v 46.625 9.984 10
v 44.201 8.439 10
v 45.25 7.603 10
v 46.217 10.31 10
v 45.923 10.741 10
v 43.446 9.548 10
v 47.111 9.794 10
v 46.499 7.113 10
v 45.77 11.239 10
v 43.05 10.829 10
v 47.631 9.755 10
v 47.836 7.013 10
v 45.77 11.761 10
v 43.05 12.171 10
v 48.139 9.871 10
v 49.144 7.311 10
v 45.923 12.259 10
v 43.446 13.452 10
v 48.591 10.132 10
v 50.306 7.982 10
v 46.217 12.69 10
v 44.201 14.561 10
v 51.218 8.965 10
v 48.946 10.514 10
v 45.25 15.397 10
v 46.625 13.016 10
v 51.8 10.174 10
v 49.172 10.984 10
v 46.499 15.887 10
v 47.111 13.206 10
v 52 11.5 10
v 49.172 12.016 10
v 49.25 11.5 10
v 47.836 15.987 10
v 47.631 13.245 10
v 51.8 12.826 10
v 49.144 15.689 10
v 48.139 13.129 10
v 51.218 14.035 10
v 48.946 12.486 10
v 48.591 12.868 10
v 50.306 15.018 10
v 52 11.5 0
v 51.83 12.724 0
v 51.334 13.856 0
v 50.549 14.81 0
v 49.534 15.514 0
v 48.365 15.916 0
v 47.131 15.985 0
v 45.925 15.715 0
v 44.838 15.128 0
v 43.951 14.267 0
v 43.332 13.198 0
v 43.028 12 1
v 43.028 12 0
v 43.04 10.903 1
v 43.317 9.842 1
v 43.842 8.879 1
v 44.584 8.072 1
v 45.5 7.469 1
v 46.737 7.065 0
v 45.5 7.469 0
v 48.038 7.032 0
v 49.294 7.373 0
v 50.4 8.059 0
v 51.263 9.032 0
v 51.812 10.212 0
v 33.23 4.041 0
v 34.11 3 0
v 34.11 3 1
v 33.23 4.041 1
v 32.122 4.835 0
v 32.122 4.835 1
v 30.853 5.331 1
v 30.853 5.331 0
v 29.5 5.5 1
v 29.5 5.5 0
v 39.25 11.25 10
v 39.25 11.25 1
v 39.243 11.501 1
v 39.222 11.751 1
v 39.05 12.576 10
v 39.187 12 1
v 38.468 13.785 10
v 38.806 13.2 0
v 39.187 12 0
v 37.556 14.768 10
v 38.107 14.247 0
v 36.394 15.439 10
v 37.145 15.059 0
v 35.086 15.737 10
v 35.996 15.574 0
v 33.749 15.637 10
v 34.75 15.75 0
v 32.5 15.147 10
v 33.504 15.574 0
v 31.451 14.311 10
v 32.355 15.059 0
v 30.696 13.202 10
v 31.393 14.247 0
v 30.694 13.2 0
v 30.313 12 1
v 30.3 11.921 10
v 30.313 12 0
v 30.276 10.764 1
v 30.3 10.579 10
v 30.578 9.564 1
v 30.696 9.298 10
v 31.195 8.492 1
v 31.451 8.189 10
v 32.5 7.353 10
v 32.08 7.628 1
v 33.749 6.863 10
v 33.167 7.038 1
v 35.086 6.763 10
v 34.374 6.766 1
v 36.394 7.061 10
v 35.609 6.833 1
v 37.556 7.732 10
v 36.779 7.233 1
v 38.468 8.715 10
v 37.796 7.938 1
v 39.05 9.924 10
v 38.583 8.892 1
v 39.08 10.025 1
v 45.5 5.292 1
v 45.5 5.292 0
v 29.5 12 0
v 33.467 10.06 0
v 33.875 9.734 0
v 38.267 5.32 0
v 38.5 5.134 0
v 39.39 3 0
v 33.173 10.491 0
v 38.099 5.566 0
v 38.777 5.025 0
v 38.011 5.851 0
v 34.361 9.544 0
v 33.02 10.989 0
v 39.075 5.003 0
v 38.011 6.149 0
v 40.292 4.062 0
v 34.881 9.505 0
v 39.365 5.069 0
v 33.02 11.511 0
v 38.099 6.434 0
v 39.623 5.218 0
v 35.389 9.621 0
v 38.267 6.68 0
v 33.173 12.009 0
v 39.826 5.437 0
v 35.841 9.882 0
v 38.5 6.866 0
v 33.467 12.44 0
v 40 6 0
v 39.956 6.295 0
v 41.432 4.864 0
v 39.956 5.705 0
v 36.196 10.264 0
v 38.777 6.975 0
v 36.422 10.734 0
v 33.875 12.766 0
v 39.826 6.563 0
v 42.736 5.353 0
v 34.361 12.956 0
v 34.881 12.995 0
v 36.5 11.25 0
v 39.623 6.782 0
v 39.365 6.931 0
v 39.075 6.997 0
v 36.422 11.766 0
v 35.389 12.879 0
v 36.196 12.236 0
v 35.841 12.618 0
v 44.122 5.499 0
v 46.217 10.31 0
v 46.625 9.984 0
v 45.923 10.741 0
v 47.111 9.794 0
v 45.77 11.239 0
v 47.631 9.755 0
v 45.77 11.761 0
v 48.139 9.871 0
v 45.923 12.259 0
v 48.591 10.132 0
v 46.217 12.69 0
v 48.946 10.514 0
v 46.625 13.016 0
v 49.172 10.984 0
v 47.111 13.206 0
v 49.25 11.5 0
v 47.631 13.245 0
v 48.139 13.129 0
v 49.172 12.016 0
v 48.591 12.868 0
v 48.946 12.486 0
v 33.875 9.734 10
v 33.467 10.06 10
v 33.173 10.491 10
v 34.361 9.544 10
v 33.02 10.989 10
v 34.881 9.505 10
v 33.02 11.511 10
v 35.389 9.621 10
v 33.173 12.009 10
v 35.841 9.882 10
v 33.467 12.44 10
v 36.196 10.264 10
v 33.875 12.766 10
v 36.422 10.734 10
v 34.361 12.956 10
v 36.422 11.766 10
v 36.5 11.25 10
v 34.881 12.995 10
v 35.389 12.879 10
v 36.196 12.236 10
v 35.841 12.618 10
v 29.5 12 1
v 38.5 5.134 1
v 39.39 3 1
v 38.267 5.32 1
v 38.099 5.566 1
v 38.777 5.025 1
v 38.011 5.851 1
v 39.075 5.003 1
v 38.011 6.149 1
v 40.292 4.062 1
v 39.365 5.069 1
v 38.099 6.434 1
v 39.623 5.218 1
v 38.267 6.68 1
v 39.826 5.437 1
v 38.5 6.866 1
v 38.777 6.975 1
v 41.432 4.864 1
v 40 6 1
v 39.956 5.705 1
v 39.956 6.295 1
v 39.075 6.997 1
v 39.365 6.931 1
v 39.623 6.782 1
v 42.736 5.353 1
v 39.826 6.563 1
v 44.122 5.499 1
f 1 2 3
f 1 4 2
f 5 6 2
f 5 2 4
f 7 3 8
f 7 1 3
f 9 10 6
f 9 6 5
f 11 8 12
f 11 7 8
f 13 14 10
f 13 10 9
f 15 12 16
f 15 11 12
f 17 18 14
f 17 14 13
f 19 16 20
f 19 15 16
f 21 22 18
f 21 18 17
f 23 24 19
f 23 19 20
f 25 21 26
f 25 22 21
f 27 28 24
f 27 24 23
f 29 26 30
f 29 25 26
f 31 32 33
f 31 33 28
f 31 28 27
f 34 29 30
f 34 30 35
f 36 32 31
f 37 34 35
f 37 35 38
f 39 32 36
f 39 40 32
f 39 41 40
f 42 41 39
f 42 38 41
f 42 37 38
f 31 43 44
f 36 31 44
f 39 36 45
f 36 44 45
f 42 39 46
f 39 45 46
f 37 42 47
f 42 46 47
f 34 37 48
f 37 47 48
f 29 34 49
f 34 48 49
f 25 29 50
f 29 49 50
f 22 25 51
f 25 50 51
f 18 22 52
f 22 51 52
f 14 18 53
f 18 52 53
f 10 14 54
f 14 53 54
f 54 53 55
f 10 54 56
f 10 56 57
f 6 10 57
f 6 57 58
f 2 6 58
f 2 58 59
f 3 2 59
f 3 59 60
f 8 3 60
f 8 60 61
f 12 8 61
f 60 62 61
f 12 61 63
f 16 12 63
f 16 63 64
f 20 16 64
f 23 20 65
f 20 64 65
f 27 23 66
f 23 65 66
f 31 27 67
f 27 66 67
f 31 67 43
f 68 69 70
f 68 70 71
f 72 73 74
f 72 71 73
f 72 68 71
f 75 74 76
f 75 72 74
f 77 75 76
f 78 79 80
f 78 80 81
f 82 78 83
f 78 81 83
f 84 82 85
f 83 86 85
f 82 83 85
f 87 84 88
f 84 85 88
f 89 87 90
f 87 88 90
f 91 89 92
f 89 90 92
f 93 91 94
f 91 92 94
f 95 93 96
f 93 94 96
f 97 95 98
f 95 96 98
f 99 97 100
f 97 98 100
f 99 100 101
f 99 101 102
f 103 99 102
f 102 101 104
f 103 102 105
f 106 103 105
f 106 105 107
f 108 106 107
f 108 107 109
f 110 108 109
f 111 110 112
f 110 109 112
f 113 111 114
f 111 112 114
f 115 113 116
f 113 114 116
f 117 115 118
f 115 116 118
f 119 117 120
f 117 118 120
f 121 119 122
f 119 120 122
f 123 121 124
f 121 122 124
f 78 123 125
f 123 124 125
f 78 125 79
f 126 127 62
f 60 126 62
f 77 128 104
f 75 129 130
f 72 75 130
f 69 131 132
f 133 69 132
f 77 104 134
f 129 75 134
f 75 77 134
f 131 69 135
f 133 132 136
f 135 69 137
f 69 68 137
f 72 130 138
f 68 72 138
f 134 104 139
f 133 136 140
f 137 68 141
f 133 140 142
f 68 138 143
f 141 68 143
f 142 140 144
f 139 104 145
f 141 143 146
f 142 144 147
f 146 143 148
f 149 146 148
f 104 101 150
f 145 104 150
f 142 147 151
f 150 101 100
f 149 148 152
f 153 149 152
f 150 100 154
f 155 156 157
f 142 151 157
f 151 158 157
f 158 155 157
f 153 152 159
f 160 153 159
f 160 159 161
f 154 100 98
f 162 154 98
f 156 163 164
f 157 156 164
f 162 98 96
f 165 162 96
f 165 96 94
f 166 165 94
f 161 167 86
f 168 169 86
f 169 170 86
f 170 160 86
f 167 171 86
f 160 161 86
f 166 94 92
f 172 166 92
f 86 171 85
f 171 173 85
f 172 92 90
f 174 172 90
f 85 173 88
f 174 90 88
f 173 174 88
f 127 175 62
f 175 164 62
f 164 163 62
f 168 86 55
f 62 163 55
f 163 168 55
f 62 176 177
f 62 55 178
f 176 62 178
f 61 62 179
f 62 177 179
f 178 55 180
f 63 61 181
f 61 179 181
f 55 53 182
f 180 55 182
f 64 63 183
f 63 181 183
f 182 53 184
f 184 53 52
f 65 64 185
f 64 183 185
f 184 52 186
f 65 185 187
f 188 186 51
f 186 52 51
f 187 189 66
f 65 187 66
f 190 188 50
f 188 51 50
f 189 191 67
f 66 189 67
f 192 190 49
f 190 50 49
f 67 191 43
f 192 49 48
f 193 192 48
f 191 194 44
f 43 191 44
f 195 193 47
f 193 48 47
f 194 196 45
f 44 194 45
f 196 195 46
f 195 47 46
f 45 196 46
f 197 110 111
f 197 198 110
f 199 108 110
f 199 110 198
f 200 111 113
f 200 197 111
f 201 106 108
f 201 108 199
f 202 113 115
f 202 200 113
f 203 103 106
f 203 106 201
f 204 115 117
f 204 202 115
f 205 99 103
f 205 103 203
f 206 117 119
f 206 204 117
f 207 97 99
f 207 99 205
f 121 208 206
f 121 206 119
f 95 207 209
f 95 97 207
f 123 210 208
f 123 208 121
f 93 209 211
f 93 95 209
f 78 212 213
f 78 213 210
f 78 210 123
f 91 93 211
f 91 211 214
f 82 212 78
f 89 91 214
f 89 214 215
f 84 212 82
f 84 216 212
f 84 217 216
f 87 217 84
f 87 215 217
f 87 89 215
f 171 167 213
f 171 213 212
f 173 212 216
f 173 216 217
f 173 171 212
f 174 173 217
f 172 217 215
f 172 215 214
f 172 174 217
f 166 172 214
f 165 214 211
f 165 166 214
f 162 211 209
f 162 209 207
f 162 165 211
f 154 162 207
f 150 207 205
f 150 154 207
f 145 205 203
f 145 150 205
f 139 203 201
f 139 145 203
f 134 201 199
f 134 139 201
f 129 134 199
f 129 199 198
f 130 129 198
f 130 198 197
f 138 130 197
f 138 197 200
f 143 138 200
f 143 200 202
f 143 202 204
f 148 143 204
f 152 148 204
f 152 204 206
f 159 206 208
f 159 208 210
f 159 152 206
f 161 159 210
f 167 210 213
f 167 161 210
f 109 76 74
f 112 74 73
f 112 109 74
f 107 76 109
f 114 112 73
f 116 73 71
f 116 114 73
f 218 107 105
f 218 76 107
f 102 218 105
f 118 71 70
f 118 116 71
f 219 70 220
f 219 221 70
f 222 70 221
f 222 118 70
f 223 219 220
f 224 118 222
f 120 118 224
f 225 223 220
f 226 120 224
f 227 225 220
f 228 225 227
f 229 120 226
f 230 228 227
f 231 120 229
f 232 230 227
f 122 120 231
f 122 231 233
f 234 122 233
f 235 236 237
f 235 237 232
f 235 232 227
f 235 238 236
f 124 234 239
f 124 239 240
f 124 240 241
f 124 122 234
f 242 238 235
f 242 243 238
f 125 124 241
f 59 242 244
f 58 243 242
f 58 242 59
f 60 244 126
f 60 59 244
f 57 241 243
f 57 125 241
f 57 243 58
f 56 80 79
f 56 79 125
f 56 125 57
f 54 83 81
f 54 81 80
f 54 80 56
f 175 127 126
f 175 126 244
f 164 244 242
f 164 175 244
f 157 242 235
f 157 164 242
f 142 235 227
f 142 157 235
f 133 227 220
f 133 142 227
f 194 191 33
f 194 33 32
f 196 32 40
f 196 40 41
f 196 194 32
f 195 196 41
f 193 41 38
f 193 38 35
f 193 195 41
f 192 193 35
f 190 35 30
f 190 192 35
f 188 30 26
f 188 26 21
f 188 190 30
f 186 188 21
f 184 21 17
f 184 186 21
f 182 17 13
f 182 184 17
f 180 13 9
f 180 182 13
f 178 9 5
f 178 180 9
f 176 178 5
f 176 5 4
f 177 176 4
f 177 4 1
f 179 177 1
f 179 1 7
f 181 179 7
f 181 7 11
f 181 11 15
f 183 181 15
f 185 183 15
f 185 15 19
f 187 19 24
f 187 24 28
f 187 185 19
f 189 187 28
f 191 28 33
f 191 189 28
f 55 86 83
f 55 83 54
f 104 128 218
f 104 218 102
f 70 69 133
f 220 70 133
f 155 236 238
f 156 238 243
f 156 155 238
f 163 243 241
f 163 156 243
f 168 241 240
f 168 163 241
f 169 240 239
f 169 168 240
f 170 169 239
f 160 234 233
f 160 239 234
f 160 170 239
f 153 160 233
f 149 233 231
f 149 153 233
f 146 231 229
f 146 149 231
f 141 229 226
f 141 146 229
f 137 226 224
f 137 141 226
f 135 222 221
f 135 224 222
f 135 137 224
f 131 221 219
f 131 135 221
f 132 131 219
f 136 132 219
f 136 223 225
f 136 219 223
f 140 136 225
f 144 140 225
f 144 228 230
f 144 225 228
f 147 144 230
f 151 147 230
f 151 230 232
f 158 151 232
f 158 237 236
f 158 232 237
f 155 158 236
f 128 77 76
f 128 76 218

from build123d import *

# Parameters (mm, degrees)
CYLINDER010_R     = 1
CYLINDER010_DEPTH = 10
CYLINDER016_R     = 5.5
CYLINDER016_DEPTH = 10
CYLINDER012_R     = 1.75
CYLINDER012_DEPTH = 10
CYLINDER013_R     = 1.75
CYLINDER013_DEPTH = 10
CYLINDER014_R     = 5.5
CYLINDER014_DEPTH = 10
CYLINDER015_R     = 4.5
CYLINDER015_DEPTH = 10
CYLINDER011_R     = 4.5
CYLINDER011_DEPTH = 10
BOX001_W          = 16
BOX001_H          = 9
BOX001_DEPTH      = 1


with BuildPart() as cylinder010:
    # Cylinder010 → Cylinder010 (new body)
    with BuildSketch(Plane(origin=(9, 6, 0), x_dir=(1, 0, 0), z_dir=(0, 0, 1))):
        Circle(CYLINDER010_R)
    extrude(amount=CYLINDER010_DEPTH)


with BuildPart() as cylinder016:
    # Cylinder016 → Cylinder016 (new body)
    with BuildSketch(Plane(origin=(14, 0, 0), x_dir=(1, 0, 0), z_dir=(0, 0, 1))):
        Circle(CYLINDER016_R)
    extrude(amount=CYLINDER016_DEPTH)


with BuildPart() as cylinder012:
    # Cylinder012 → Cylinder012 (new body)
    with BuildSketch(Plane(origin=(17.5, 11.5, 0), x_dir=(1, 0, 0), z_dir=(0, 0, 1))):
        Circle(CYLINDER012_R)
    extrude(amount=CYLINDER012_DEPTH)


with BuildPart() as cylinder013:
    # Cylinder013 → Cylinder013 (new body)
    with BuildSketch(Plane(origin=(4.75, 11.25, 0), x_dir=(1, 0, 0), z_dir=(0, 0, 1))):
        Circle(CYLINDER013_R)
    extrude(amount=CYLINDER013_DEPTH)


with BuildPart() as fusion003:
    # Cylinder014 → Cylinder014 (new body)
    with BuildSketch(Plane(origin=(-0.5, 0, 0), x_dir=(1, 0, 0), z_dir=(0, 0, 1))):
        Circle(CYLINDER014_R)
    extrude(amount=CYLINDER014_DEPTH)

    # Fusion003: union Cylinder010, Cylinder016, Cylinder012, Cylinder013
    add(cylinder010.part)
    add(cylinder016.part)
    add(cylinder012.part)
    add(cylinder013.part)


with BuildPart() as cylinder015:
    # Cylinder015 → Cylinder015 (new body)
    with BuildSketch(Plane(origin=(17.5, 11.5, 0), x_dir=(1, 0, 0), z_dir=(0, 0, 1))):
        Circle(CYLINDER015_R)
    extrude(amount=CYLINDER015_DEPTH)


with BuildPart() as cylinder011:
    # Cylinder011 → Cylinder011 (new body)
    with BuildSketch(Plane(origin=(4.75, 11.25, 0), x_dir=(1, 0, 0), z_dir=(0, 0, 1))):
        Circle(CYLINDER011_R)
    extrude(amount=CYLINDER011_DEPTH)


with BuildPart() as cut004_button_template:
    # Box001 → Box001 (new body)
    with BuildSketch(Plane(origin=(-0.5, 3, 0), x_dir=(1, 0, 0), z_dir=(0, 0, 1))):
        with Locations((8, 4.5)):
            Rectangle(BOX001_W, BOX001_H)
    extrude(amount=BOX001_DEPTH)

    # Fusion004: union Cylinder015, Cylinder011
    add(cylinder015.part)
    add(cylinder011.part)

    # Cut004: cut Fusion003
    add(fusion003.part, mode=Mode.SUBTRACT)


with BuildPart() as cut004_button_template_1:
    # Cut004 placement: moved
    add(cut004_button_template.part.moved(Location((30, 0, 0))))


solid = cut004_button_template_1.part
